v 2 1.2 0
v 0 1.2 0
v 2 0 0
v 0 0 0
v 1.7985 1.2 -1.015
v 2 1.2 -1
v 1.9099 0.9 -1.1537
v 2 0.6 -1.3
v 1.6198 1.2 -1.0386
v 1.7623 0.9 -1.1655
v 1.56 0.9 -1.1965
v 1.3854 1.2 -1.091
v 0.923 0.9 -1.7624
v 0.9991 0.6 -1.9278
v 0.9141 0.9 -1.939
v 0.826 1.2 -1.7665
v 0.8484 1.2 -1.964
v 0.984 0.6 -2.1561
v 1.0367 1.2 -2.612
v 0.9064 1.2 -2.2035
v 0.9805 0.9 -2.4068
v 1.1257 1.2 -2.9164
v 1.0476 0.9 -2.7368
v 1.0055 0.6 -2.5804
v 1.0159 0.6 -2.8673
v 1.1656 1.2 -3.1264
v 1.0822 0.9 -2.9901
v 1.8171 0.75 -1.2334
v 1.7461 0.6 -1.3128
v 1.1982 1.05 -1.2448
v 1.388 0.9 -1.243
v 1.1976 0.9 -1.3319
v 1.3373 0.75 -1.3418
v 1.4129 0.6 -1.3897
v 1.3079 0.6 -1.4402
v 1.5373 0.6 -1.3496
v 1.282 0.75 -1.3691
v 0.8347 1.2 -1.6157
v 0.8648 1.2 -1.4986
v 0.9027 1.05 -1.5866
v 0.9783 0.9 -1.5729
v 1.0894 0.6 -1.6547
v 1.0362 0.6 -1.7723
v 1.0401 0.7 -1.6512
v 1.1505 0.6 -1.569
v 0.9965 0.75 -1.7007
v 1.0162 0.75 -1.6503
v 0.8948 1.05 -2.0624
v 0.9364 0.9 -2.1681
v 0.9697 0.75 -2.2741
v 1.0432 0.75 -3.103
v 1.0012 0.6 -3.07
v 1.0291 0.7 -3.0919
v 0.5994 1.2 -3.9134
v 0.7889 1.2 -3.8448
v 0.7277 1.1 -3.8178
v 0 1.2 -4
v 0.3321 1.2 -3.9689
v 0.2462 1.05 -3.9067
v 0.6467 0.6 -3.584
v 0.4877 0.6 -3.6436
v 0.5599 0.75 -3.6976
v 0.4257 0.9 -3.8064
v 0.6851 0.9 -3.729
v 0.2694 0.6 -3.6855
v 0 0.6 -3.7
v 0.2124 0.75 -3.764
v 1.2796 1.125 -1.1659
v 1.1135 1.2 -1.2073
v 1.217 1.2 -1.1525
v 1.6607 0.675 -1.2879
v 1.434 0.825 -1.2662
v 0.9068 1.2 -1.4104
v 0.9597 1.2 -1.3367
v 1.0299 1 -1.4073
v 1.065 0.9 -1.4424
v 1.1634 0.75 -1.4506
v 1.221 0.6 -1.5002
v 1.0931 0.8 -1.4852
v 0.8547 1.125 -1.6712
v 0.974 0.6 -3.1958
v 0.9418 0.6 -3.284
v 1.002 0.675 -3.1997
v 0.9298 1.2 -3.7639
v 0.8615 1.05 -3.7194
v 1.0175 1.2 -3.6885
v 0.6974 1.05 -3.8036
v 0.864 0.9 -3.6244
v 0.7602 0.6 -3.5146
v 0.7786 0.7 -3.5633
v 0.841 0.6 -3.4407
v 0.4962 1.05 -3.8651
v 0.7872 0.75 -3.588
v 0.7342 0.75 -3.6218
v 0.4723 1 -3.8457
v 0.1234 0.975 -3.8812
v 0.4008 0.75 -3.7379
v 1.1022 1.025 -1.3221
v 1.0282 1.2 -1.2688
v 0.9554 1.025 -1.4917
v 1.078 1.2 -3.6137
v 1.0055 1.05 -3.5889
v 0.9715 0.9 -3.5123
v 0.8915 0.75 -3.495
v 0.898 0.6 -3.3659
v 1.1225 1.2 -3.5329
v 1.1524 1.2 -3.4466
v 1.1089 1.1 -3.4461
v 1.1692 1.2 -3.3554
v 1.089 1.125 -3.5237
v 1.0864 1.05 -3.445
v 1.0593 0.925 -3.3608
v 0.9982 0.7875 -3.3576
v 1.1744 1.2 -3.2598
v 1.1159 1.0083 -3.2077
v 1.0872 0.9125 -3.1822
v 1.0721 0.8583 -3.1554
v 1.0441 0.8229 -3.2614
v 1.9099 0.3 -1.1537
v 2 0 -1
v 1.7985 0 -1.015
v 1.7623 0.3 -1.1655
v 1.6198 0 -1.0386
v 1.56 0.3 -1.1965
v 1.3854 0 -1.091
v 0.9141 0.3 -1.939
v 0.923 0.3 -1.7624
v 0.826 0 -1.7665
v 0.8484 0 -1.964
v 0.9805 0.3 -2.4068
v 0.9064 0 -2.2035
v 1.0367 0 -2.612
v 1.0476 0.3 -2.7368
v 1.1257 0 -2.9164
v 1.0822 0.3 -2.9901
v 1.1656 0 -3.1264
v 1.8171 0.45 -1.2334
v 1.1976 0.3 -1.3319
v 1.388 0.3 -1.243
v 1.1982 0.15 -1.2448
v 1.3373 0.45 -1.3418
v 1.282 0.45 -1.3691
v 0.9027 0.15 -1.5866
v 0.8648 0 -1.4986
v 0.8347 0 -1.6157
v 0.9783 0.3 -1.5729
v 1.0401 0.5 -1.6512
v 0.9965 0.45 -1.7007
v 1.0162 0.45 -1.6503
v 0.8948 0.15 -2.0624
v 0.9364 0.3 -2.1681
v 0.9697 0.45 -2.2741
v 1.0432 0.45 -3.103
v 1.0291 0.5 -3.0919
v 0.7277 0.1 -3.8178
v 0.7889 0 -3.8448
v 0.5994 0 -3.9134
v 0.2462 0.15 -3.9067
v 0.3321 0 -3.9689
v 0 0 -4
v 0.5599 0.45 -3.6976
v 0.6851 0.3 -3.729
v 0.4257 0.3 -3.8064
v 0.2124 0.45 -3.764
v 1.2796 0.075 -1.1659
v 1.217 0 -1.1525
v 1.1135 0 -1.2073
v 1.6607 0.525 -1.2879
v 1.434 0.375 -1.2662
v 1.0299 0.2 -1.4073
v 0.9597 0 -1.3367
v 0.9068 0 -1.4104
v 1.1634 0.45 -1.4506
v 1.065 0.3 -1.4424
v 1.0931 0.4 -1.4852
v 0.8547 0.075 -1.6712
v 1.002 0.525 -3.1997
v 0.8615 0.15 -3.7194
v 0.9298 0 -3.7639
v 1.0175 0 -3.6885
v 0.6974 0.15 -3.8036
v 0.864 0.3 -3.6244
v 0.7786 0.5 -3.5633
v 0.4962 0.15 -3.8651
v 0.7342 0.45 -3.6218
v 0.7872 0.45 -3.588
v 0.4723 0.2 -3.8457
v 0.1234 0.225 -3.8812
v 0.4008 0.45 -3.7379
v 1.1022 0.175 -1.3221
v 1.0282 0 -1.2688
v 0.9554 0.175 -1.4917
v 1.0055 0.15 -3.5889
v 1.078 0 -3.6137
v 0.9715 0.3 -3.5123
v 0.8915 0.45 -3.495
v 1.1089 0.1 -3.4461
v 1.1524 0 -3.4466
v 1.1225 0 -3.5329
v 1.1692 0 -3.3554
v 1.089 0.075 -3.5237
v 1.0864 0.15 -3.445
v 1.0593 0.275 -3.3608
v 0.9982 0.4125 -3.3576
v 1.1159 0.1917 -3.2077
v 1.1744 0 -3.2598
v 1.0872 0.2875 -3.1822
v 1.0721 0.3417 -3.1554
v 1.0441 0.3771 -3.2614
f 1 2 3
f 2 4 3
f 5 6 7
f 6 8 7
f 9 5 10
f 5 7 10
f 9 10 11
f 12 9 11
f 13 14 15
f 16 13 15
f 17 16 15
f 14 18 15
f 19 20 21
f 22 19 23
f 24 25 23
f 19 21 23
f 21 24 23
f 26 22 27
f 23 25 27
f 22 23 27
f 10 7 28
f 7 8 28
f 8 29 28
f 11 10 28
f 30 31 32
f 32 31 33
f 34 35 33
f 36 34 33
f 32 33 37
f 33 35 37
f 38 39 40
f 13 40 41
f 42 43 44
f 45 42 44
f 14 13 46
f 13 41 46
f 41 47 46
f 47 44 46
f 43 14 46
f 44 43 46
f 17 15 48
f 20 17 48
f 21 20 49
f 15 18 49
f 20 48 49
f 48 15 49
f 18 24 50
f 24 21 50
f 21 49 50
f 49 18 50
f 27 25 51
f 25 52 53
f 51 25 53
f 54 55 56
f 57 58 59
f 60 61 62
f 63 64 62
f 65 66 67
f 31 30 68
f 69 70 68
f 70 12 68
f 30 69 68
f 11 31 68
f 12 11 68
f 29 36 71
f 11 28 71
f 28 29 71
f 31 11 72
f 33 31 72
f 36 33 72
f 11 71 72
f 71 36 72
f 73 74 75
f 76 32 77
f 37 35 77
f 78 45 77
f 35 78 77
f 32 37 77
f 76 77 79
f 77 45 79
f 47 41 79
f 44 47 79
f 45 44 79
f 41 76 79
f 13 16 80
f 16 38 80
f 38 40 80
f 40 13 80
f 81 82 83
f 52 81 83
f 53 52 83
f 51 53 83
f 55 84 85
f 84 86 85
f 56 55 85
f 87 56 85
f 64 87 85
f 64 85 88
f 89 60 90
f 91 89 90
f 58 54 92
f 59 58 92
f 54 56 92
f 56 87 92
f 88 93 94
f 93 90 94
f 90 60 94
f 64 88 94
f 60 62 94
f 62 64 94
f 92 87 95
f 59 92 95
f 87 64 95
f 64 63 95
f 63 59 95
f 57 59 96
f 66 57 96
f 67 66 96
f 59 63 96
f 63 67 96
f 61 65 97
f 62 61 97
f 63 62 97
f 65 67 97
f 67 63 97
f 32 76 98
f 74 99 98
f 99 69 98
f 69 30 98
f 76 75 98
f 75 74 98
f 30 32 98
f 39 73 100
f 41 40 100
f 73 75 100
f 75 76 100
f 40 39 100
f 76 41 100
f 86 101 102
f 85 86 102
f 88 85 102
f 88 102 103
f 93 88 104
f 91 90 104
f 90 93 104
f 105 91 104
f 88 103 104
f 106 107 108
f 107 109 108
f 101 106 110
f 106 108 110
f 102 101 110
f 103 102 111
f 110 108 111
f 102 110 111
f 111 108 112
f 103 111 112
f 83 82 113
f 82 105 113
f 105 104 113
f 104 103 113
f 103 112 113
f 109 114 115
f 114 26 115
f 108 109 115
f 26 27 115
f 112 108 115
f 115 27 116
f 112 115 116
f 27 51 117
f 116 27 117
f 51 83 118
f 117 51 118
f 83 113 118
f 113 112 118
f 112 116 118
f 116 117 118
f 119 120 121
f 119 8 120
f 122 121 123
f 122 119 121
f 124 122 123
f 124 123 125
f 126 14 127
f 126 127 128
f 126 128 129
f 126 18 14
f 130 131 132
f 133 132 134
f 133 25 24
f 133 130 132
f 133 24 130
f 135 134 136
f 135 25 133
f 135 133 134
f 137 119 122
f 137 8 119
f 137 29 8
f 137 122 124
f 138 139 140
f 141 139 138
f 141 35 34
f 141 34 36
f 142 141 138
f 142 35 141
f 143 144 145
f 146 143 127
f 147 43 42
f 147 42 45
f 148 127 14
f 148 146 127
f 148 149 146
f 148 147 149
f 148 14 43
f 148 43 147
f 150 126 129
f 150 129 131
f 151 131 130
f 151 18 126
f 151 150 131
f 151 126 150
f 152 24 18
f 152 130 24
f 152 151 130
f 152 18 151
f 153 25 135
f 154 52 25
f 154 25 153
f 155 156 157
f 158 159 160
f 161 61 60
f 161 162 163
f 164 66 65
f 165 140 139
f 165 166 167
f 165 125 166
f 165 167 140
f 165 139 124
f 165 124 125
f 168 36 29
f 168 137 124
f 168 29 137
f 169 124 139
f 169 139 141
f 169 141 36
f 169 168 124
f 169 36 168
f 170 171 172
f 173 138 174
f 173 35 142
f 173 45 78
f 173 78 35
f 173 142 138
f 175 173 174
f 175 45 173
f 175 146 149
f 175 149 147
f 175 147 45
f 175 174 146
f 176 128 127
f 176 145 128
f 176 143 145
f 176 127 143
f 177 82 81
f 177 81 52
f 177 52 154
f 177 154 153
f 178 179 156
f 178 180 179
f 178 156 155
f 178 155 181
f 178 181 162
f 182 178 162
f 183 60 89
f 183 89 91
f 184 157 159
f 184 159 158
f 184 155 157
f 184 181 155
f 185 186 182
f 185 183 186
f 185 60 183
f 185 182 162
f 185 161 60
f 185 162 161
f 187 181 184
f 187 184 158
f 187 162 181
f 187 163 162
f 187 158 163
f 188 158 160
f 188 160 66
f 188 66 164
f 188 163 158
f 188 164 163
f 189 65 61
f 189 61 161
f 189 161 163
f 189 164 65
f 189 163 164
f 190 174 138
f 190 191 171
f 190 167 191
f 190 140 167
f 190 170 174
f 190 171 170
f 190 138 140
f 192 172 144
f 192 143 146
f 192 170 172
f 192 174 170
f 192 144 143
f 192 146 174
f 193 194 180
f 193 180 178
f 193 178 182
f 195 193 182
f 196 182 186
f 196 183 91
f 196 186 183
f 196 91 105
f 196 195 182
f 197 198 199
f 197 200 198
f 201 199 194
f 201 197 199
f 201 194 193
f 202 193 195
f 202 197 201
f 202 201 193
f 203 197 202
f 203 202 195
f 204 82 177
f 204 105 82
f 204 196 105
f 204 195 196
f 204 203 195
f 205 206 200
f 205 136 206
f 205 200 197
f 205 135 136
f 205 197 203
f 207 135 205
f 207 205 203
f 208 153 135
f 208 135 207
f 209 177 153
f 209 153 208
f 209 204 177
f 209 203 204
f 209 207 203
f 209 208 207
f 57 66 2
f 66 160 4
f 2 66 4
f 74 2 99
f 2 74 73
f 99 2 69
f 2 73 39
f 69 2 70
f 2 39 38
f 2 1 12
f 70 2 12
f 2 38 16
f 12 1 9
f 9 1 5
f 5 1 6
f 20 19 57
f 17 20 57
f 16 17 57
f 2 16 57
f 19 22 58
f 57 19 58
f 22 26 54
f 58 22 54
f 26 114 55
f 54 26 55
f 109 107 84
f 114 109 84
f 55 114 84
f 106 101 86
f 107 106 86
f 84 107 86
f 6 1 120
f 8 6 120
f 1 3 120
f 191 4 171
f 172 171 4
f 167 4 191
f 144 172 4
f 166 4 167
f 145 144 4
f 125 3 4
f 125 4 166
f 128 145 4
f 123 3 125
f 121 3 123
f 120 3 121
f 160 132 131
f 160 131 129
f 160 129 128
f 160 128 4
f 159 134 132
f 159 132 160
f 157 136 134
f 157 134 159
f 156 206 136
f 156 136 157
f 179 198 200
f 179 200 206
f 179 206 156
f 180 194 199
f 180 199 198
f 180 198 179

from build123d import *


with BuildPart() as part:
    # Sketch1 → Loft1 section 0
    with BuildSketch(Plane(origin=(0, 0, 0), x_dir=(1, 0, 0), z_dir=(0, 1, 0))):
        with BuildLine():
            Line((0, 0), (2, 0))
            Line((2, 0), (2, 1))
            add(Edge.make_bspline(
                [(0, 4), (2.939621294, 3.853681673), (-0.939621294, 1.146318327), (2, 1)],
                knots=[0, 0, 0, 0, 1, 1, 1, 1], degree=3))
            Line((0, 4), (0, 0))
        make_face()
    # Sketch2 → Loft1 section 1
    with BuildSketch(Plane(origin=(0, 0.6, 0), x_dir=(1, 0, 0), z_dir=(0, 1, 0))):
        with BuildLine():
            Line((0, 0), (2, 0))
            Line((2, 0), (2, 1.3))
            add(Edge.make_bspline(
                [(0, 3.7), (2.166666667, 3.7), (-0.166666667, 1.3), (2, 1.3)],
                knots=[0, 0, 0, 0, 1, 1, 1, 1], degree=3))
            Line((0, 3.7), (0, 0))
        make_face()
    loft1 = loft()

    # Mirror1: Loft1 across plane
    add(loft1.mirror(Plane.ZX.offset(0.6)))


solid = part.part
